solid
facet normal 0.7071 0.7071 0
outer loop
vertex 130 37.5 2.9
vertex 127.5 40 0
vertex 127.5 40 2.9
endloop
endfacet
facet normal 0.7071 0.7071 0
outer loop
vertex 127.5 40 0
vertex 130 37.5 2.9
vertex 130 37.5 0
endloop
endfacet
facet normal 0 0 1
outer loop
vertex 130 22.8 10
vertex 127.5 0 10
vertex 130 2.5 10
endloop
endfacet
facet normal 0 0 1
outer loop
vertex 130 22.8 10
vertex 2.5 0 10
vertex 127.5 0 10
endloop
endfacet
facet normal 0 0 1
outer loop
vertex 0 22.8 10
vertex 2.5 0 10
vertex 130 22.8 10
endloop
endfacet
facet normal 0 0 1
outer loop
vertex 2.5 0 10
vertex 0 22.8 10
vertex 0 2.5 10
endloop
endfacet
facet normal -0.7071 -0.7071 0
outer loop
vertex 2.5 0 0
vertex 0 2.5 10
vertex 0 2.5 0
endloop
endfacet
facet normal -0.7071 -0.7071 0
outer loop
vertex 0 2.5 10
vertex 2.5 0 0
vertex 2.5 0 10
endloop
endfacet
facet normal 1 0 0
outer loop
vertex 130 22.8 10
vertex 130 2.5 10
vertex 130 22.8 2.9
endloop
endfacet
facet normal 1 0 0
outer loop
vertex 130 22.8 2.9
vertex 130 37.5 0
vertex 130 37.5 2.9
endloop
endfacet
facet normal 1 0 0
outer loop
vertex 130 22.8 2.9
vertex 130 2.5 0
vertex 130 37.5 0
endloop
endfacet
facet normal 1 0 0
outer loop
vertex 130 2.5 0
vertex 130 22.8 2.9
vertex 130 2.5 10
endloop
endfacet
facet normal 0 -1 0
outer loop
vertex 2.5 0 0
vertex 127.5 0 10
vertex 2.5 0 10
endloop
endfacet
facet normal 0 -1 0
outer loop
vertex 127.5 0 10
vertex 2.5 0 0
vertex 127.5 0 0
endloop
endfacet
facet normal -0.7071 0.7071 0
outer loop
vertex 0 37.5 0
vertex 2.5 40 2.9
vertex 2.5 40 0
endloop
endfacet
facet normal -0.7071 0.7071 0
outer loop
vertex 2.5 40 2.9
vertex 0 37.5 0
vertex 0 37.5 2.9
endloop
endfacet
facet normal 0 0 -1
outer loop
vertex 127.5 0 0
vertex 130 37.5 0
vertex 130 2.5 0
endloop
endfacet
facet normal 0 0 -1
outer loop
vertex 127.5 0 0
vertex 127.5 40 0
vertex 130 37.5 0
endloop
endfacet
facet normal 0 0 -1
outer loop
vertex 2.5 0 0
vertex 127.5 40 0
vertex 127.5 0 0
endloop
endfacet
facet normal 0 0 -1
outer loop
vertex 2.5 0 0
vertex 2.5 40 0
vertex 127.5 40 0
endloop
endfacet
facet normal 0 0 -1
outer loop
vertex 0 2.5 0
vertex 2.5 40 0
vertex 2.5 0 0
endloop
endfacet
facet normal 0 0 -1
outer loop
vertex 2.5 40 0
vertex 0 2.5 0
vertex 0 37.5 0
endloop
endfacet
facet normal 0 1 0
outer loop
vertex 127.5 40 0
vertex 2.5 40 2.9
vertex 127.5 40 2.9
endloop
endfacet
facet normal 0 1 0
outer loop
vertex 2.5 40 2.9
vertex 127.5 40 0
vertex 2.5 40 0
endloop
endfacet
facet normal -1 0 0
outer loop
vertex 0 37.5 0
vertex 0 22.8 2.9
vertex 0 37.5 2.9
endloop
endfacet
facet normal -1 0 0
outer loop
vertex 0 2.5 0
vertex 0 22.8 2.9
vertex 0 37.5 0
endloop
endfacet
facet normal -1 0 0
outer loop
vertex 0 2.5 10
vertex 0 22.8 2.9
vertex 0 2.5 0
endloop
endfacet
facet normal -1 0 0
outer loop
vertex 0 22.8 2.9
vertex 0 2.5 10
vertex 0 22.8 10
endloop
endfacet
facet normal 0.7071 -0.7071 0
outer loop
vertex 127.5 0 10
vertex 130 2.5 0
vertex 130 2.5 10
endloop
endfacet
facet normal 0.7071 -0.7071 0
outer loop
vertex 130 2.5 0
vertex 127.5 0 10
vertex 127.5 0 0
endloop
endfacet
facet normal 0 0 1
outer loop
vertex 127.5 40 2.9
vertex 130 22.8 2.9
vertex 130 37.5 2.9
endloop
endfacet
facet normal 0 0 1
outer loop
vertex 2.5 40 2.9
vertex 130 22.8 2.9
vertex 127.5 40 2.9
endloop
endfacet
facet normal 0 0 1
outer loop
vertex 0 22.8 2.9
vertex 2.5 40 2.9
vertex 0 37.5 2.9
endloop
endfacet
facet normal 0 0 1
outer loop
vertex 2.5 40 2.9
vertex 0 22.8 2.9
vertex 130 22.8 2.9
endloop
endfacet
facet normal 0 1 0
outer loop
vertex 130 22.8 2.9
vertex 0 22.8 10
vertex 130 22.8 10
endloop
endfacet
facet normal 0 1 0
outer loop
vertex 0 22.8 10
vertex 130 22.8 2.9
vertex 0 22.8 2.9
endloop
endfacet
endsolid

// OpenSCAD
$fn = 32;

// ----------------------------------------------------------------------
// Stepped bar: sidestep, 130 x 40 x 10/2.9 mm
// ----------------------------------------------------------------------

// --- parameters (mm) ---
bar_l = 130;              // bar length, X
bar_w = 40;               // bar width, Y
plate_t = 10;             // thickness of the thick zone, Z
thin_t = 2.9;             // thickness of the thin zone
corner_c = 2.5;           // corner chamfer of the bar
step_cut = 7.1;           // material removed from the thin zone
ledge_y = 22.8;           // start of the ledge from the front edge
depth_1 = 7.1;            // depth of cut 1 from the top face

profile = [[2.5, 0], [127.5, 0], [130, 2.5], [130, 37.5], [127.5, 40], [2.5, 40], [0, 37.5], [0, 2.5]];  // primary outline, 8 points, counter clockwise
void_1 = [[-1, 22.8], [131, 22.8], [131, 41], [-1, 41]];  // ledge cut along one edge, 4 points

// --- the one profile operation ---
difference() {
  linear_extrude(height = plate_t) polygon(points = profile);
  translate([0, 0, plate_t - depth_1])
    linear_extrude(height = depth_1 + 1) polygon(points = void_1);
}
